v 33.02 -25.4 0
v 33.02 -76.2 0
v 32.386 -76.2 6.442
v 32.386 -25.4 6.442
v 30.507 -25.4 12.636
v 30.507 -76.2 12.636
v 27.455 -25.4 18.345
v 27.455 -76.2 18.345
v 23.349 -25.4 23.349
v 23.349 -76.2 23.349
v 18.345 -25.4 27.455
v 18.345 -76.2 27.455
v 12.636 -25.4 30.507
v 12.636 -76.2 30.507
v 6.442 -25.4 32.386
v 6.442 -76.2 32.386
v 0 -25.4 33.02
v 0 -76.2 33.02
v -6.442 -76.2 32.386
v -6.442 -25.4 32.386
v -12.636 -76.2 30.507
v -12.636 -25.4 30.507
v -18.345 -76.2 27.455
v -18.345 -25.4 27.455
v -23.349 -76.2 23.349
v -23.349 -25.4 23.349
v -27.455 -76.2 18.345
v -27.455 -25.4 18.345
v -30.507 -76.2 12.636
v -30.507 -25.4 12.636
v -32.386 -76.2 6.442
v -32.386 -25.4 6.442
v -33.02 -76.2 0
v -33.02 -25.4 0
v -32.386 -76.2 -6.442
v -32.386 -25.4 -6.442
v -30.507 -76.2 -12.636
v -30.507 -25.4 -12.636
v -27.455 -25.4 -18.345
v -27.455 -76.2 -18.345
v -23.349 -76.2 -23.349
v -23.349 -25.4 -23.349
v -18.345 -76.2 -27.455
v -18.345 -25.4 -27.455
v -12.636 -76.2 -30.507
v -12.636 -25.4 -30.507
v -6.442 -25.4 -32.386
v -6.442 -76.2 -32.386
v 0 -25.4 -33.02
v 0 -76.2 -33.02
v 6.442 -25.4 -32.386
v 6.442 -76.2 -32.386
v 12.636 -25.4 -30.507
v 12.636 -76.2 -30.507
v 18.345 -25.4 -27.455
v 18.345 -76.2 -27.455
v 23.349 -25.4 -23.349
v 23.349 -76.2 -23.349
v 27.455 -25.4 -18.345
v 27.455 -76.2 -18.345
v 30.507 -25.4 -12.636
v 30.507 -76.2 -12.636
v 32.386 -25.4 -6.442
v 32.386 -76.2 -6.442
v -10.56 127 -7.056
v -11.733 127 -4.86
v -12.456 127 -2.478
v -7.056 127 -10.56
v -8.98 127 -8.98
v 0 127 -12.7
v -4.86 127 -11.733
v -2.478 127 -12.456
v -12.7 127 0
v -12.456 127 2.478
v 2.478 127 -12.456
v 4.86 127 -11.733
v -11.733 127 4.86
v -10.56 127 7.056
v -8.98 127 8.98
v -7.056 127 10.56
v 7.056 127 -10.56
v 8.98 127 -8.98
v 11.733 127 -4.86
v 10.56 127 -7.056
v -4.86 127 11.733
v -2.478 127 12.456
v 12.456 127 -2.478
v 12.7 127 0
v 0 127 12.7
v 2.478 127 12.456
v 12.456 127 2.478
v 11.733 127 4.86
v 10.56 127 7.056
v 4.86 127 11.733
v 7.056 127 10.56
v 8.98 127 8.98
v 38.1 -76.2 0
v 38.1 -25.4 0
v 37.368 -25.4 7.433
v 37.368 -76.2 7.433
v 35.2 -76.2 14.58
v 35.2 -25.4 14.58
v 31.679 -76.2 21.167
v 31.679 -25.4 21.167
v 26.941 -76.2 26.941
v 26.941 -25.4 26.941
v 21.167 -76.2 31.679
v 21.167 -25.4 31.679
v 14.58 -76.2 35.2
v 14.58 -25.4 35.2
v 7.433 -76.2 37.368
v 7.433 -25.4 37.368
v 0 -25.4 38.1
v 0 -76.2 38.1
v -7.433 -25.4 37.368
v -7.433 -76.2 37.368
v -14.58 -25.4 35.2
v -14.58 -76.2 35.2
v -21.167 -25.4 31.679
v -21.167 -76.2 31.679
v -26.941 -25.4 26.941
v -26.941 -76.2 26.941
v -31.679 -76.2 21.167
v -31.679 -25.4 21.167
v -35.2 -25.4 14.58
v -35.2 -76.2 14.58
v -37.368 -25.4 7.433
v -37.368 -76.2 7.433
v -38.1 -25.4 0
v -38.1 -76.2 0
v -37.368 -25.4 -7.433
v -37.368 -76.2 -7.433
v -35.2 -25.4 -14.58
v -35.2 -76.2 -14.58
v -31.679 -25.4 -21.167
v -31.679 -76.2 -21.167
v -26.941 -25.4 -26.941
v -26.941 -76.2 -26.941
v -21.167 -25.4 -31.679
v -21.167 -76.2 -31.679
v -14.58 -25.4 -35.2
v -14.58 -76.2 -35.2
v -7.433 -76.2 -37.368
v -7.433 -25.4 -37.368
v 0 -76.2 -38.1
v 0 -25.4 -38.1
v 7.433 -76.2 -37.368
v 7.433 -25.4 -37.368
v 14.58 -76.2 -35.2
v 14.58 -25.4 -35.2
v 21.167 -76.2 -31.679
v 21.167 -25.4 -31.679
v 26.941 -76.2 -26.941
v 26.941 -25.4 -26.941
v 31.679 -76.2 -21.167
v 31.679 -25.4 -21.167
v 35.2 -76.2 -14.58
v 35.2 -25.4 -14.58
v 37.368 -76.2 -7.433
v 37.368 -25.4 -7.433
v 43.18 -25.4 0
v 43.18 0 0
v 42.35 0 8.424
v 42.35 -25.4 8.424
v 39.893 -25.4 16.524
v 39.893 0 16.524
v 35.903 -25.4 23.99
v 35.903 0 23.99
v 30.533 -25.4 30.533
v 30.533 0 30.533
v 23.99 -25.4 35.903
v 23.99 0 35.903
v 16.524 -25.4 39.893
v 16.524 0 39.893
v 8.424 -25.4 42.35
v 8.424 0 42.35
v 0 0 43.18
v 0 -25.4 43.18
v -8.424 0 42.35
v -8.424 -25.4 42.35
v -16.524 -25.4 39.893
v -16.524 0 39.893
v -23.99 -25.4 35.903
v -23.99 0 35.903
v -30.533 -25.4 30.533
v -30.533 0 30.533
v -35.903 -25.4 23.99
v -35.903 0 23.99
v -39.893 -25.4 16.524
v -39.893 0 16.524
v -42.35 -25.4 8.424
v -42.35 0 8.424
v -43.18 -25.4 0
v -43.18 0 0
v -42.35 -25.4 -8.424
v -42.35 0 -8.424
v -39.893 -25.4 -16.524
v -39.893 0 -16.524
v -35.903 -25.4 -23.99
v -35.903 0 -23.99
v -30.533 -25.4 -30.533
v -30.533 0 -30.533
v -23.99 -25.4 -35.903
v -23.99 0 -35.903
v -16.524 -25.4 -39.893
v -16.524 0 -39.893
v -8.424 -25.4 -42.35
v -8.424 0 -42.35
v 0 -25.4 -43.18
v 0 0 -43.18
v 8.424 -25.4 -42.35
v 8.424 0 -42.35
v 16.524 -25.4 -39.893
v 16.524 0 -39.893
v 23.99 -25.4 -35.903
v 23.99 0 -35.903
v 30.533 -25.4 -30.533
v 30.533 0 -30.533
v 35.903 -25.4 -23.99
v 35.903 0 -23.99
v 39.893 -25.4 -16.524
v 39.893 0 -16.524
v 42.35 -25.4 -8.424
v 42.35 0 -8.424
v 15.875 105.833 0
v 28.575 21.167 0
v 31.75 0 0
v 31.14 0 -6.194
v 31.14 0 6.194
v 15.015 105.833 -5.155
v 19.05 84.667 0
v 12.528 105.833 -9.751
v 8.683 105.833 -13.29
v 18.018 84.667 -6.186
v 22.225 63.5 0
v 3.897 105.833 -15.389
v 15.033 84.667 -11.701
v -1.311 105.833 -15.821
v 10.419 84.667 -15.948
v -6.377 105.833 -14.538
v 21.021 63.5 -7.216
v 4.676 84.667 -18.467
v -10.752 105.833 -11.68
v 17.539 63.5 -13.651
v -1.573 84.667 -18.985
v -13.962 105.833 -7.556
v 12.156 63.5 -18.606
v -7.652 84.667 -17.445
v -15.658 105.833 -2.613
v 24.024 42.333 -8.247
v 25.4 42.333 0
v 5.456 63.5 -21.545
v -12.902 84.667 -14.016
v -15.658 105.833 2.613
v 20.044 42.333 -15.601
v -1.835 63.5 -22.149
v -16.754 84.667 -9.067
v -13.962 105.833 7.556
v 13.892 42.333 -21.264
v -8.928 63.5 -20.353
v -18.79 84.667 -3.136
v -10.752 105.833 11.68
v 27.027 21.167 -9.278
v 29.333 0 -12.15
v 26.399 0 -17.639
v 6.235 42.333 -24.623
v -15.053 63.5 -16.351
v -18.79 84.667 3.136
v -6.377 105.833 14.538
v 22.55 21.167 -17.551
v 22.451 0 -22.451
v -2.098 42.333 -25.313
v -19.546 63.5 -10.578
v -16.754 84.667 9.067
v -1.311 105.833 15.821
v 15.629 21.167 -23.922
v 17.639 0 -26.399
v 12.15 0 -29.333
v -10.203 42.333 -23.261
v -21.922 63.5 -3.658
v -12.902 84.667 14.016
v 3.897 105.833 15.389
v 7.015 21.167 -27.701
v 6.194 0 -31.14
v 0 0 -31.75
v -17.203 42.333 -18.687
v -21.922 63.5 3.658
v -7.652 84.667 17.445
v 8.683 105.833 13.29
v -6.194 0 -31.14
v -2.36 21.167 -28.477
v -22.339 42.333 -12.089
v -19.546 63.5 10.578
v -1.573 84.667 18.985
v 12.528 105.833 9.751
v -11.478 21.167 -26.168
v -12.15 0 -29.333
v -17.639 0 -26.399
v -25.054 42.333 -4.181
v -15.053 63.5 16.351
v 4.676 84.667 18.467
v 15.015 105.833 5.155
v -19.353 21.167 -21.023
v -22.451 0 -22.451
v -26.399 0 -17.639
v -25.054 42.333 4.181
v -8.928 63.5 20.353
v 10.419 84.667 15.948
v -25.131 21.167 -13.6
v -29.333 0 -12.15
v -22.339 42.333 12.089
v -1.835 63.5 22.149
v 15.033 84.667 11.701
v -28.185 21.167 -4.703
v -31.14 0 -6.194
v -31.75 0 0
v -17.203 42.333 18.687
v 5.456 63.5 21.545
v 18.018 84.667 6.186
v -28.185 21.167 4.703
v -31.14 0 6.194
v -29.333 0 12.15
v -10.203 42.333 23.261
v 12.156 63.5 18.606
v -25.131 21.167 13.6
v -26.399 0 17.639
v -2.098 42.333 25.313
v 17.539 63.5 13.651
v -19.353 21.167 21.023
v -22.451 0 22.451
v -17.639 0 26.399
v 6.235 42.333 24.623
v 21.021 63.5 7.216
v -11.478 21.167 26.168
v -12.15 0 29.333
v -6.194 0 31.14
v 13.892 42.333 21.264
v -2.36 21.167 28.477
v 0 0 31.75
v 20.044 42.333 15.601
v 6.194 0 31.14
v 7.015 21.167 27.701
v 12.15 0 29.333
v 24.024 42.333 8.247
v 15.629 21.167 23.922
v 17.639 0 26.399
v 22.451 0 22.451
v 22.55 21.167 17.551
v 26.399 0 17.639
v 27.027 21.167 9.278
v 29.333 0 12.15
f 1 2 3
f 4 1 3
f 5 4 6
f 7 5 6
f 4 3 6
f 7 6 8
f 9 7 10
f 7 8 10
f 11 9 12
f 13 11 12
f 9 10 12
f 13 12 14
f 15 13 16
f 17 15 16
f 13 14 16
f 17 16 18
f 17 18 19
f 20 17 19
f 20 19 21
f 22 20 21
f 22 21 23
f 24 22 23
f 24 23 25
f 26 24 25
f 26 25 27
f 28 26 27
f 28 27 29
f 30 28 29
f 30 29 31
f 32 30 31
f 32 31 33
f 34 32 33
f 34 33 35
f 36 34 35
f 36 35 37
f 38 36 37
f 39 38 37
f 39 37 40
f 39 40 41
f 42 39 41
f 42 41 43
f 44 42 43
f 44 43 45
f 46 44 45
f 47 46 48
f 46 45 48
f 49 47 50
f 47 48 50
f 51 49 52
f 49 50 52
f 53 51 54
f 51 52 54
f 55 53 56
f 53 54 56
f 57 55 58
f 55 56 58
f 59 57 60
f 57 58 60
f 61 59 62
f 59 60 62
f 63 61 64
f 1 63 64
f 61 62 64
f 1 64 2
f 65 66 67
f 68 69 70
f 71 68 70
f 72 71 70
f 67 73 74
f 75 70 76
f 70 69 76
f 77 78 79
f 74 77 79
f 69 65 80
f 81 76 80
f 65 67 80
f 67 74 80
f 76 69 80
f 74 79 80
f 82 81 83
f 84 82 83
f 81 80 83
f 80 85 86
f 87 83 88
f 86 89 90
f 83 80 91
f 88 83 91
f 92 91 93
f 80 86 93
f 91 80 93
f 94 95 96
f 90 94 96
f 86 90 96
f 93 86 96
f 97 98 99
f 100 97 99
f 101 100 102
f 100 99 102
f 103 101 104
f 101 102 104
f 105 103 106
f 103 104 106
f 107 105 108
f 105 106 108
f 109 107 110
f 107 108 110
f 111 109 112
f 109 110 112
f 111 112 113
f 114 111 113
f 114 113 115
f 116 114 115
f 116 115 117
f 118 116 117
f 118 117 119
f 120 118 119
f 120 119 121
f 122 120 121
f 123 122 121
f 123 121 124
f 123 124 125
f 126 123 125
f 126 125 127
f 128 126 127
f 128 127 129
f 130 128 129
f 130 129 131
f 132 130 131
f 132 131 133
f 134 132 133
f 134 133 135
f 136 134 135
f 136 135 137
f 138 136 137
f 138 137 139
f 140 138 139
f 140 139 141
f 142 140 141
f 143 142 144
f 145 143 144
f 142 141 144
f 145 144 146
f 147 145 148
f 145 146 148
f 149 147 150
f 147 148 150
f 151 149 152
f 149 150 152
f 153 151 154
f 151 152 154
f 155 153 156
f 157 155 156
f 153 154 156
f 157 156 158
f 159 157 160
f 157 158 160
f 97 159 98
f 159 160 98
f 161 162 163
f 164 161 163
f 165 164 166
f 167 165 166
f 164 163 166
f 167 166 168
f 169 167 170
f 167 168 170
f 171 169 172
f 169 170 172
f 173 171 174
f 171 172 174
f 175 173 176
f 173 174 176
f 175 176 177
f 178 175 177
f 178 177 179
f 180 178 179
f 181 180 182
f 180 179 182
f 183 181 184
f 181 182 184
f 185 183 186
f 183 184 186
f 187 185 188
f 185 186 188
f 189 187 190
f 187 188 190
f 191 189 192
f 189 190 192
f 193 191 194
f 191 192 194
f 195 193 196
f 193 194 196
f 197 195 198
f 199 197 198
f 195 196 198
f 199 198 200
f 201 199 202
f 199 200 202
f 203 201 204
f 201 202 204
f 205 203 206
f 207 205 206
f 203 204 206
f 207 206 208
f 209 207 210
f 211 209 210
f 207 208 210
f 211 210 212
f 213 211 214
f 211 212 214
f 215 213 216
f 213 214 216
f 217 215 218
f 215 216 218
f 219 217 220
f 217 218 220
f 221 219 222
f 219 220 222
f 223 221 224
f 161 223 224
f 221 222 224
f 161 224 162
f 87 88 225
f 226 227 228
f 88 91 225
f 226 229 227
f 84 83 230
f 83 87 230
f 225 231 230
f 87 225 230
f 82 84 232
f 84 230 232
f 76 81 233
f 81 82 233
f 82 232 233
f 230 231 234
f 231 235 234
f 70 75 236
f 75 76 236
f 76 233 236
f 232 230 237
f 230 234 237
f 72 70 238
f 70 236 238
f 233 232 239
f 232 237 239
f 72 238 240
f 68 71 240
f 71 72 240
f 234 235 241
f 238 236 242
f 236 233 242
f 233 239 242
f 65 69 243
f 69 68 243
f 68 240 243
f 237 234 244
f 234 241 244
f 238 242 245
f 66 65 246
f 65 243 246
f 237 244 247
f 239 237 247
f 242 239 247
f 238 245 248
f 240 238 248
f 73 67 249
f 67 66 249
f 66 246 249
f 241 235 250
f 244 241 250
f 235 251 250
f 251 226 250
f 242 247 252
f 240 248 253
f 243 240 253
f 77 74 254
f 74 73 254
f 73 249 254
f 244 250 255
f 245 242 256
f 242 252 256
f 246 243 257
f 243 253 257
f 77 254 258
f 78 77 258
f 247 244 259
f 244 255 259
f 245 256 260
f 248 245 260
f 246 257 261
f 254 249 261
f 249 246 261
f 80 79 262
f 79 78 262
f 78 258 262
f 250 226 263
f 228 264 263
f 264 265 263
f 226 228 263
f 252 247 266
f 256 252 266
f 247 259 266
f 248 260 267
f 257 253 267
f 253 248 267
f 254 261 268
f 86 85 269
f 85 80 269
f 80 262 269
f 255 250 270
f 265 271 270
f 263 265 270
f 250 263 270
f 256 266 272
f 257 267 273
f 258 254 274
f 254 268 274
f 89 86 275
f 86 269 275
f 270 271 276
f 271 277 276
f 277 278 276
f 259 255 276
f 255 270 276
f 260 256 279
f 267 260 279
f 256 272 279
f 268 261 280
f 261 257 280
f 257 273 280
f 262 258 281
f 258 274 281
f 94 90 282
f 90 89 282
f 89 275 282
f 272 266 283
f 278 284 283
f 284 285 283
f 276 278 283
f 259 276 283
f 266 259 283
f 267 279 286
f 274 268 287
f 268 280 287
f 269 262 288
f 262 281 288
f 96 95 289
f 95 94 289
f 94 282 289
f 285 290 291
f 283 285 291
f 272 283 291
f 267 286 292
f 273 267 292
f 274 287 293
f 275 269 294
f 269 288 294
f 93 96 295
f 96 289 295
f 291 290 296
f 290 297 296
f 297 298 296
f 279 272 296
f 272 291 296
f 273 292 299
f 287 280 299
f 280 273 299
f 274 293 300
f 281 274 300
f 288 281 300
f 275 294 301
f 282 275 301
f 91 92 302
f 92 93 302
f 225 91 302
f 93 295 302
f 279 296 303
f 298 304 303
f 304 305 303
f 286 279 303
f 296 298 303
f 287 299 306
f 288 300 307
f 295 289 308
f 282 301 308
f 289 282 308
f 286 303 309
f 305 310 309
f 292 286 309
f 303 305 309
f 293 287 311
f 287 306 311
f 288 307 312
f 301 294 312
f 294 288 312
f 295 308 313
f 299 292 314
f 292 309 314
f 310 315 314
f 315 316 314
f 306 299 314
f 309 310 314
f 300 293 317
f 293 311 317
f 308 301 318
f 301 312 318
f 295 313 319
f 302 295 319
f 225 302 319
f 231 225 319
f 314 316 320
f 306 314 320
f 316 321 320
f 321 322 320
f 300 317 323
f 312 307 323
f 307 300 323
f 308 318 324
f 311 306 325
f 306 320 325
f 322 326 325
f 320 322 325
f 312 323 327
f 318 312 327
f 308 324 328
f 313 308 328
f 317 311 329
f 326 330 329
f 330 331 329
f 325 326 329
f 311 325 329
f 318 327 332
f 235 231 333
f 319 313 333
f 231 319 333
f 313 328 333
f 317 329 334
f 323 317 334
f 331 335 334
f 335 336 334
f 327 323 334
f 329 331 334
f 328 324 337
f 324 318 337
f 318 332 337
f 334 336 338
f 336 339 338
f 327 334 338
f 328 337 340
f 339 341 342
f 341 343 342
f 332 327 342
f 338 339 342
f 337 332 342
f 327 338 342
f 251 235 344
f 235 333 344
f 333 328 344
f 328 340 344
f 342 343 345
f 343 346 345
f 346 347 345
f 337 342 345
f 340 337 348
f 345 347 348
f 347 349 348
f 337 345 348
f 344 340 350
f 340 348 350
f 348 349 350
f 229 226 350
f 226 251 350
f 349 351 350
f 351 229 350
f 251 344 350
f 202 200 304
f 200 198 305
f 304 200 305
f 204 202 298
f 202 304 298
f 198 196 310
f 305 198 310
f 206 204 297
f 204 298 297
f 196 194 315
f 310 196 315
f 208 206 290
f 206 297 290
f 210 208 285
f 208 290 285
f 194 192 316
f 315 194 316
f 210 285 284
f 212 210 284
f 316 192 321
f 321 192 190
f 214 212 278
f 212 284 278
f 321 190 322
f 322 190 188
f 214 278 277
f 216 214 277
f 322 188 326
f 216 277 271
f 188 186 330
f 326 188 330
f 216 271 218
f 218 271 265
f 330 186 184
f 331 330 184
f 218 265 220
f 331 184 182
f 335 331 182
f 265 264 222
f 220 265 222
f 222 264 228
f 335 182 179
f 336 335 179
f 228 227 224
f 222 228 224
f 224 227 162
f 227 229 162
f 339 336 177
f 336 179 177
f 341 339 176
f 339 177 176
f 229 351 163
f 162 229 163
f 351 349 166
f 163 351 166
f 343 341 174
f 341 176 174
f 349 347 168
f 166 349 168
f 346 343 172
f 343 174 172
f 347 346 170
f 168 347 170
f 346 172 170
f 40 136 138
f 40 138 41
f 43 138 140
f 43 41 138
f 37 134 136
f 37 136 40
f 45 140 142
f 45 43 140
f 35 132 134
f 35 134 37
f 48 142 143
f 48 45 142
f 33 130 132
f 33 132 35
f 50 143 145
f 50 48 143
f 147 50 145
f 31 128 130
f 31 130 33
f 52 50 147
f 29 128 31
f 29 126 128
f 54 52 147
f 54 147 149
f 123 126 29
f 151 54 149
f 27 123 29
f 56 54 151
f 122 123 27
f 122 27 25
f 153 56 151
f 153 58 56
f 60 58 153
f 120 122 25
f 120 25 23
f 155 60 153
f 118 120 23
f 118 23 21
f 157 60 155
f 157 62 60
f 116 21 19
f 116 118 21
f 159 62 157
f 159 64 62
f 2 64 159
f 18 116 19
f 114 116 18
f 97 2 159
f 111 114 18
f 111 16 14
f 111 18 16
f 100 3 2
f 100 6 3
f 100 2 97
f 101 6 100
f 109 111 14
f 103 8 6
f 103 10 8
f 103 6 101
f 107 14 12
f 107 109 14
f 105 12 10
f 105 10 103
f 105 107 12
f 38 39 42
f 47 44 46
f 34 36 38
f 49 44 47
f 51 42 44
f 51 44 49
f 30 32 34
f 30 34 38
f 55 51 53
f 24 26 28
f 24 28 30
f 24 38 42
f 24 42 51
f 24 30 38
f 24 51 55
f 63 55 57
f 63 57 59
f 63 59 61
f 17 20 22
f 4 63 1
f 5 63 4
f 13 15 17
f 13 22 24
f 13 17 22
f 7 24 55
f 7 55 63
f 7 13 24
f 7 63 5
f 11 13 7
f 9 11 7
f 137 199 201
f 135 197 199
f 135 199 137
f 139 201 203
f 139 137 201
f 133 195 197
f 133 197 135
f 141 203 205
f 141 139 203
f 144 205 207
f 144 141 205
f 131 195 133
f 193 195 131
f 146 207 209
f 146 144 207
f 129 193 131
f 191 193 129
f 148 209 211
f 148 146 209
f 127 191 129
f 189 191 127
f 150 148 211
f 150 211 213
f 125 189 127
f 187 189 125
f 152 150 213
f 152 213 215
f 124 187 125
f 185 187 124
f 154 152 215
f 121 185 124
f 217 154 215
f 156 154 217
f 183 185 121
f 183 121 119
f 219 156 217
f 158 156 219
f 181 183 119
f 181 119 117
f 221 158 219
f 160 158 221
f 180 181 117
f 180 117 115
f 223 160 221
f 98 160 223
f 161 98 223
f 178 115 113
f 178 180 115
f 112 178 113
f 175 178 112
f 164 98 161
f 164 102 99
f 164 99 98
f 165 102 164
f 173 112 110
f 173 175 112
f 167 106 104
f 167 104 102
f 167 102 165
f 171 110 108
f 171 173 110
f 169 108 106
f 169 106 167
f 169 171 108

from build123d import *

# Parameters (mm, degrees)
F0_R      = 38.1
F1_DEPTH  = 76.2
F2_R      = 33.02
F3_DEPTH  = 69.85
F5_R      = 12.7
F6_DEPTH  = 127
F6_FACE_R = 12.7
F4_R      = 31.75
F8_R      = 43.18
F9_DEPTH  = 25.4


with BuildPart() as f1:
    # F0 (on Front) → F1 (new body)
    with BuildSketch(Plane.XZ):
        Circle(F0_R)
    extrude(amount=F1_DEPTH)

    # F2 (on face) → F3 (cut)
    with BuildSketch(Plane.XZ.offset(76.2)):
        Circle(F2_R)
    extrude(amount=-F3_DEPTH, mode=Mode.SUBTRACT)

    # F5 (on Front) → F6 (join)
    with BuildSketch(Plane.XZ):
        Circle(F5_R)
    extrude(amount=-F6_DEPTH)

    # F6_face (on face) → F7 section 0
    with BuildSketch(Plane(origin=(0, 127, 0), x_dir=(1, 0, 0), z_dir=(0, 1, 0))):
        Circle(F6_FACE_R)
    # F4 (on face) → F7 section 1
    with BuildSketch(Plane(origin=(0, 0, 0), x_dir=(-1, 0, 0), z_dir=(0, 1, 0))):
        Circle(F4_R)
    loft()

    # F8 (on Front) → F9 (join)
    with BuildSketch(Plane.XZ):
        Circle(F8_R)
    extrude(amount=F9_DEPTH)


solid = f1.part
